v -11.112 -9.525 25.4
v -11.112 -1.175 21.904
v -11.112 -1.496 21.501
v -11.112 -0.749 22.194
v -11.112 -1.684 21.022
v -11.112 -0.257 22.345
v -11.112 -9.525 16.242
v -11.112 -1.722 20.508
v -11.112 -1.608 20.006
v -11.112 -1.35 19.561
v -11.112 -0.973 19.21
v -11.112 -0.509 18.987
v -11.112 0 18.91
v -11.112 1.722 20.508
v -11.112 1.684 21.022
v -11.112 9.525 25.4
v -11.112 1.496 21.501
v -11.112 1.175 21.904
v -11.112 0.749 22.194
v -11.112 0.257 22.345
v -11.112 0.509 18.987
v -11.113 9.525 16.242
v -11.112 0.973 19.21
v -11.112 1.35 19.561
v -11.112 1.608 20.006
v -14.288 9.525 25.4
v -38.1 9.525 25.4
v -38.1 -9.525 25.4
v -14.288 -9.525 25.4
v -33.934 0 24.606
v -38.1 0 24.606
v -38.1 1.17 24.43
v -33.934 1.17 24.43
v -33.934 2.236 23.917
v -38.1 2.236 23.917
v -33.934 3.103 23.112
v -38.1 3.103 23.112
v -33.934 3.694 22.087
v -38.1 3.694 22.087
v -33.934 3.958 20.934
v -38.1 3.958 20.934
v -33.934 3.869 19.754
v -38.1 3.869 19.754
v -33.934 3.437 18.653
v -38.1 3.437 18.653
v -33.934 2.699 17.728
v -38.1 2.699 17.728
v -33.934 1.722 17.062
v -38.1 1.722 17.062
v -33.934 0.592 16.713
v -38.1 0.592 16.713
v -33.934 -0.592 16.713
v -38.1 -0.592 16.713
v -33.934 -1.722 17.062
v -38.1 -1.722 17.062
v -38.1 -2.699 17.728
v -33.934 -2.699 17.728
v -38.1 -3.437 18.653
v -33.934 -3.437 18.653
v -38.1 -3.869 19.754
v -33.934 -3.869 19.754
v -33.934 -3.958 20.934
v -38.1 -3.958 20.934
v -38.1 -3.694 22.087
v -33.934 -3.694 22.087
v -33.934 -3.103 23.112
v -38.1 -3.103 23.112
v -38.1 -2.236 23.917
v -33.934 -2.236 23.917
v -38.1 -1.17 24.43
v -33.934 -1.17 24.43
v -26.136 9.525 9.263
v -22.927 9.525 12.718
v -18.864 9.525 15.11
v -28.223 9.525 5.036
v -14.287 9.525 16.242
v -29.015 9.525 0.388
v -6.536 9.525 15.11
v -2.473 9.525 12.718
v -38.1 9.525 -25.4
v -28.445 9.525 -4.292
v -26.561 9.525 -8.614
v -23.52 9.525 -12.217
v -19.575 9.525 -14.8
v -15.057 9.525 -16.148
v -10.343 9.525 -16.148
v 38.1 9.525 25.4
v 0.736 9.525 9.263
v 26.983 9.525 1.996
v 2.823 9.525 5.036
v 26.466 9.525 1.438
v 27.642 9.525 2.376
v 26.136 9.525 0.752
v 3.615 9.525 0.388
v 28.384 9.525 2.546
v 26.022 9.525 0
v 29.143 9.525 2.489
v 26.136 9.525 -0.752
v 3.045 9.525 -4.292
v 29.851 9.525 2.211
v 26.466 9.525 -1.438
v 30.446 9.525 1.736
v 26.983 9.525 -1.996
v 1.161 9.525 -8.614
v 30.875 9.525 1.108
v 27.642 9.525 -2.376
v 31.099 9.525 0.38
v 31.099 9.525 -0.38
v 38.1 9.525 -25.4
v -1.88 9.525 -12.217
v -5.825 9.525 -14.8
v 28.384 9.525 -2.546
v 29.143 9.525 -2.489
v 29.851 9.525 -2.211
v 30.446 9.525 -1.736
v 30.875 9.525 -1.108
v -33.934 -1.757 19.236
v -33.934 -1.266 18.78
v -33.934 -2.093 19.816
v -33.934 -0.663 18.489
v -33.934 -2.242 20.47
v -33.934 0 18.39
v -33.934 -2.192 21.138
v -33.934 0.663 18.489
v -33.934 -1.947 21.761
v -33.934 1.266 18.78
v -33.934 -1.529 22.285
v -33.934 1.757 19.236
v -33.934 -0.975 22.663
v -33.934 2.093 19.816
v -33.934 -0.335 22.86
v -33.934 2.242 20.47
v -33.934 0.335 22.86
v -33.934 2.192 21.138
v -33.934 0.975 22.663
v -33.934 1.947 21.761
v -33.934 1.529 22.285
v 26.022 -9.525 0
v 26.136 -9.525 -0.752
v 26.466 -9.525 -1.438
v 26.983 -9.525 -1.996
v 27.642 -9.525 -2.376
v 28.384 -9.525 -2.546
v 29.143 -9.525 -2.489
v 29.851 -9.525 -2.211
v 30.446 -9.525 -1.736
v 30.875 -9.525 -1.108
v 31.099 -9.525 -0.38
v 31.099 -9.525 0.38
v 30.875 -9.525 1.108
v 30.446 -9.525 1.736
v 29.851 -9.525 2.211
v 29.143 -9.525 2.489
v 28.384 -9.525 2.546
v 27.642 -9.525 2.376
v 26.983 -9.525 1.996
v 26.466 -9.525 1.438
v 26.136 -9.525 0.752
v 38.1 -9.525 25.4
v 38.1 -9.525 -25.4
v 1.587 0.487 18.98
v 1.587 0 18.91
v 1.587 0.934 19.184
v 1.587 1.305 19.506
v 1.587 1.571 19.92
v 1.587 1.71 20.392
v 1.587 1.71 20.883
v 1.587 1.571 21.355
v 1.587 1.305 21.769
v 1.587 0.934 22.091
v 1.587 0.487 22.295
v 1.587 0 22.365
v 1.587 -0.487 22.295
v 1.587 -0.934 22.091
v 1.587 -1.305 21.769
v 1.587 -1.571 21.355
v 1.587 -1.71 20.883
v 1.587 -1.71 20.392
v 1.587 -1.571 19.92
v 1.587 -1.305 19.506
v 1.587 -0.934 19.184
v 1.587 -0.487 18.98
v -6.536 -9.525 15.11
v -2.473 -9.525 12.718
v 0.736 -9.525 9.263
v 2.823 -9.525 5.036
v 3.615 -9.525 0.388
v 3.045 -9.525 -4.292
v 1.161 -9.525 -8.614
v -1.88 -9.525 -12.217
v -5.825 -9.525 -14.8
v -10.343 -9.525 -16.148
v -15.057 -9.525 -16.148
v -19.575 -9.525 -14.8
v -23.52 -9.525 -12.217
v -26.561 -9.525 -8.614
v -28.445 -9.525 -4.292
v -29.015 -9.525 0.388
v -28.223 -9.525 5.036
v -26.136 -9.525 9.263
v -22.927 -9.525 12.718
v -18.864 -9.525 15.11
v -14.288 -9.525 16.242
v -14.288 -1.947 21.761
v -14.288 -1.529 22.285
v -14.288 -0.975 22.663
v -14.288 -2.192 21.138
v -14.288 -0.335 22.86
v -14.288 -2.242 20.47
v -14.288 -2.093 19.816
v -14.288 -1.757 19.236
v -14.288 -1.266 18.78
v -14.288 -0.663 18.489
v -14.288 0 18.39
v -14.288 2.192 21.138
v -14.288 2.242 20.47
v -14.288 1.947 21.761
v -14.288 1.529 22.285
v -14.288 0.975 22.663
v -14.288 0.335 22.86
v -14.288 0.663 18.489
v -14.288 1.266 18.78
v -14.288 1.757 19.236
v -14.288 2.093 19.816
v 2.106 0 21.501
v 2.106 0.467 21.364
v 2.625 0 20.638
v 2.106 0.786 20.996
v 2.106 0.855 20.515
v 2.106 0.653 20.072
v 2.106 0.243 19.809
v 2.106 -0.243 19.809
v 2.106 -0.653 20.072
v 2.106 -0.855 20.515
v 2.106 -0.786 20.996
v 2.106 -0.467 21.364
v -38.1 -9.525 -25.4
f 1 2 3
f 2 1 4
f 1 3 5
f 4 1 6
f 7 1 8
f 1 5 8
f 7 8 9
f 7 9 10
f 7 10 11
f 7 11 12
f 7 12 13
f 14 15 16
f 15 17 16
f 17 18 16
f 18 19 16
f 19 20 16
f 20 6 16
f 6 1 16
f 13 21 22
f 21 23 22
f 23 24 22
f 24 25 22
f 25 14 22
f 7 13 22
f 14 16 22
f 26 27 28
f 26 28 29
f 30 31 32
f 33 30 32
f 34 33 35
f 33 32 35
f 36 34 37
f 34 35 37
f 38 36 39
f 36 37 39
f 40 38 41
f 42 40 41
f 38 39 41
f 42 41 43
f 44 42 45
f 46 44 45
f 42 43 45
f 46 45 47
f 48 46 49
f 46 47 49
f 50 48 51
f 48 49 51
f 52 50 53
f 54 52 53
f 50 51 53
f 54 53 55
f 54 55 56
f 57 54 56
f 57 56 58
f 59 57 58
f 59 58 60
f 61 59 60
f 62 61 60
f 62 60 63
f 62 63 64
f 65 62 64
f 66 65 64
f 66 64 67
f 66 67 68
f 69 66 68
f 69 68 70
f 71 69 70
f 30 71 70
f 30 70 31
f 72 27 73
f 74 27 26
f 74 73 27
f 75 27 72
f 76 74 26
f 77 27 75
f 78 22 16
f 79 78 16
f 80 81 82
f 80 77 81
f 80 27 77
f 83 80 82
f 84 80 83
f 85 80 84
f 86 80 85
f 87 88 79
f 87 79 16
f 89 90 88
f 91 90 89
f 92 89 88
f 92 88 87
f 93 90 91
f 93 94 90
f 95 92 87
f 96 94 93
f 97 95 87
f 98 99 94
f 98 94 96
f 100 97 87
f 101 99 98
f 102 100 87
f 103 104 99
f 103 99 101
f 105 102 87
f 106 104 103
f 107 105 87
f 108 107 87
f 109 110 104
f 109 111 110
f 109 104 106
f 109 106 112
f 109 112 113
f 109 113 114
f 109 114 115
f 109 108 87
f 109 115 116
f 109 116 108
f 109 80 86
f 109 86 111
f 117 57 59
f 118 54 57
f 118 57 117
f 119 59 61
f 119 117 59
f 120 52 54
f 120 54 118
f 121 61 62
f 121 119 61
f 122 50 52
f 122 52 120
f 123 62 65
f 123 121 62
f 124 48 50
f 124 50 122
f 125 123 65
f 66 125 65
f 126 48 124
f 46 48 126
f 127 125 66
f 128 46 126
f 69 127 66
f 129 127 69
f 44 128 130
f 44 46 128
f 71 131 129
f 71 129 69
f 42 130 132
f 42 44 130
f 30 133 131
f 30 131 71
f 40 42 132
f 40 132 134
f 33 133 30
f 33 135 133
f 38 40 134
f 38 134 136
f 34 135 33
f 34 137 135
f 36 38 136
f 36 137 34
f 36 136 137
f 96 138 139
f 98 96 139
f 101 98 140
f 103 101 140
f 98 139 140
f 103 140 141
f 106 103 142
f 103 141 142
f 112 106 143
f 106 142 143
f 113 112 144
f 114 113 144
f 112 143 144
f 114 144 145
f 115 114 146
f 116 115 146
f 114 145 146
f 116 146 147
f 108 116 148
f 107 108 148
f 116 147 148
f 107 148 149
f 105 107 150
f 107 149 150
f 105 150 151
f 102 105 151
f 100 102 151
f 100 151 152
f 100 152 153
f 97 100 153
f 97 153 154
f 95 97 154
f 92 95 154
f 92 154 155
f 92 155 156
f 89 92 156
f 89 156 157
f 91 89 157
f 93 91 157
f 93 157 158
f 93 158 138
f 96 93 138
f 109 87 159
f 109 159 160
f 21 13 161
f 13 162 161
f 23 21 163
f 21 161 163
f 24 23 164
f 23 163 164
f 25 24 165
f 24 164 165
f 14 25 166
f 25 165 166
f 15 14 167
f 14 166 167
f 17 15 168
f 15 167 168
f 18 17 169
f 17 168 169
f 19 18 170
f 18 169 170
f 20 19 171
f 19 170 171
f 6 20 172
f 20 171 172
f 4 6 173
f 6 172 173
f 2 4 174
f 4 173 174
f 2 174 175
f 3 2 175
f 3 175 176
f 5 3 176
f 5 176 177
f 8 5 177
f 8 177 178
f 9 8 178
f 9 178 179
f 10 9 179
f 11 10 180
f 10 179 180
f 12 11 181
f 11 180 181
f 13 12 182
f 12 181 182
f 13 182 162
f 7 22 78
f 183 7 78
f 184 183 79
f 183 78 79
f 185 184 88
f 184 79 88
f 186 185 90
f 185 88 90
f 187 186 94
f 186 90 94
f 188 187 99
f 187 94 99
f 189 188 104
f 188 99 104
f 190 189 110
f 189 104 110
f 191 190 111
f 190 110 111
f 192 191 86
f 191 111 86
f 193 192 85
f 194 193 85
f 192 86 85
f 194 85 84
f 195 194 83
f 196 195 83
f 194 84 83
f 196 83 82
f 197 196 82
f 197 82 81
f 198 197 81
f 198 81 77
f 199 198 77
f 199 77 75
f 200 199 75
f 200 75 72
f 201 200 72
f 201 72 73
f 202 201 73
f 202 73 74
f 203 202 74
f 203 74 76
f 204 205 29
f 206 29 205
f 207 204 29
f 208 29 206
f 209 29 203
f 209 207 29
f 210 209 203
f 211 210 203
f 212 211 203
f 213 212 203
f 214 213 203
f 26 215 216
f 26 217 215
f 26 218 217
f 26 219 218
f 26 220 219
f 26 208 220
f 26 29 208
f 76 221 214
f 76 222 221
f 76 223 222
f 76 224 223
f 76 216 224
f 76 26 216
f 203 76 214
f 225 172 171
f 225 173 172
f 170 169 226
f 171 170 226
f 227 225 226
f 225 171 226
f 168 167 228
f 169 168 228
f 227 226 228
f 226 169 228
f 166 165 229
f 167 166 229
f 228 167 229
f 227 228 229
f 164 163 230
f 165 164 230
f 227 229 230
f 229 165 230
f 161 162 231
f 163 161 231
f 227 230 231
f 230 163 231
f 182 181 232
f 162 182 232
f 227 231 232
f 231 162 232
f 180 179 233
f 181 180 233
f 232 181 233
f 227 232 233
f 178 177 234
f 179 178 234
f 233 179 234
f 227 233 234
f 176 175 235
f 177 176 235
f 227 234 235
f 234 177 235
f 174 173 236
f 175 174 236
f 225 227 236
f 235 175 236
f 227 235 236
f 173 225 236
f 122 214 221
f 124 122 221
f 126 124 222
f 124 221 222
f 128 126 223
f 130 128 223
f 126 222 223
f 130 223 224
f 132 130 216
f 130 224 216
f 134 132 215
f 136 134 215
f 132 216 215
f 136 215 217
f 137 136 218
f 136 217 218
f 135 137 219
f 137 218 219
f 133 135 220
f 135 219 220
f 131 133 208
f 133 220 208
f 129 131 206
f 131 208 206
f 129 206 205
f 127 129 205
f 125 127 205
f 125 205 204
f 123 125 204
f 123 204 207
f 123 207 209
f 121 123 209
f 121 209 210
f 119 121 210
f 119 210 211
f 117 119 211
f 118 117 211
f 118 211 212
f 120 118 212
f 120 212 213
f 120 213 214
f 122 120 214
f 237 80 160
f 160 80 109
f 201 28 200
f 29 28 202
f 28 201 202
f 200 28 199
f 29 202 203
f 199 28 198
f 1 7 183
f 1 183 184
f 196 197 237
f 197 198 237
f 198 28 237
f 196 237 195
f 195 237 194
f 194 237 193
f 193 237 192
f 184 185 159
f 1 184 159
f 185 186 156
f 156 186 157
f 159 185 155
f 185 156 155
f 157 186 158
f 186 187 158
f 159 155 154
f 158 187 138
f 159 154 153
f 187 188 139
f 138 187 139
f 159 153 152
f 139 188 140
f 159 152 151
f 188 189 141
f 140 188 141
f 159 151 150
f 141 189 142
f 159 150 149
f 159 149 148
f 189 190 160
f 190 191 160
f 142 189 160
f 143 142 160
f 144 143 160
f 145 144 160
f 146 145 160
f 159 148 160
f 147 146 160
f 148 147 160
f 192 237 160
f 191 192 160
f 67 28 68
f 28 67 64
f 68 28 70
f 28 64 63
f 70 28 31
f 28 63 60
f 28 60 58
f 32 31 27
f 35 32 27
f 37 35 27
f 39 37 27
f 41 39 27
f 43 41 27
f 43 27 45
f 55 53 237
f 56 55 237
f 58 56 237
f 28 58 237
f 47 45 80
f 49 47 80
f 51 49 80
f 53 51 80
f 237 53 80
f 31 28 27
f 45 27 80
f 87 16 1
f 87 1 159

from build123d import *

# Parameters (mm, degrees)
SKETCH1_W                                      = 76.2
SKETCH1_H                                      = 50.8
BOSS_EXTRUDE1_DEPTH                            = 9.525
SKETCH2_R                                      = 16.3195
CUT_EXTRUDE1_DEPTH                             = 50.595085442
SKETCH3_W                                      = 3.175
SKETCH3_H                                      = 28.019395236
CUT_EXTRUDE2_DEPTH                             = 50.595085442
CBORE_FOR_8_SOCKET_HEAD_CAP_SCREW1_D           = 4.4958
CBORE_FOR_8_SOCKET_HEAD_CAP_SCREW1_DEPTH       = 23.8125
CBORE_FOR_8_SOCKET_HEAD_CAP_SCREW1_CBORE_D     = 7.9375
CBORE_FOR_8_SOCKET_HEAD_CAP_SCREW1_CBORE_DEPTH = 4.1656
F_8_32_TAPPED_HOLE1_D                          = 3.4544
F_8_32_TAPPED_HOLE1_DEPTH                      = 12.7
F_8_32_TAPPED_HOLE1_TIP                        = 1.037806461
F_1_4_20_TAPPED_HOLE1_D                        = 5.1054


with BuildPart() as part:
    # Sketch1 → Boss-Extrude1 (new, symmetric)
    with BuildSketch(Plane(origin=(0, 0, 0), x_dir=(1, 0, 0), z_dir=(0, 1, 0))):
        Rectangle(SKETCH1_W, SKETCH1_H)
    extrude(amount=BOSS_EXTRUDE1_DEPTH, both=True)

    # Sketch2 → Cut-Extrude1 (cut, through all)
    with BuildSketch(Plane(origin=(0, 9.525, 0), x_dir=(1, 0, 0), z_dir=(0, 1, 0))):
        with Locations(Location((-12.7, 0, 0), (0, 0, 270))):
            Circle(SKETCH2_R)
    extrude(amount=-CUT_EXTRUDE1_DEPTH, mode=Mode.SUBTRACT)

    # Sketch3 → Cut-Extrude2 (cut, through all)
    with BuildSketch(Plane(origin=(0, 9.525, 0), x_dir=(1, 0, 0), z_dir=(0, 1, 0))):
        with Locations((-12.7, -14.009697618)):
            Rectangle(SKETCH3_W, SKETCH3_H)
    extrude(amount=-CUT_EXTRUDE2_DEPTH, mode=Mode.SUBTRACT)

    # CBORE for #8 Socket Head Cap Screw1
    with Locations(Plane.ZY.offset(38.1)):
        with Locations((20.6375, 0)):
            CounterBoreHole(CBORE_FOR_8_SOCKET_HEAD_CAP_SCREW1_D / 2, CBORE_FOR_8_SOCKET_HEAD_CAP_SCREW1_CBORE_D / 2, CBORE_FOR_8_SOCKET_HEAD_CAP_SCREW1_CBORE_DEPTH, depth=CBORE_FOR_8_SOCKET_HEAD_CAP_SCREW1_DEPTH)

    # #8-32 Tapped Hole1
    with Locations(Plane.ZY.offset(11.1125)):
        with Locations((20.6375, 0)):
            Hole(F_8_32_TAPPED_HOLE1_D / 2, depth=F_8_32_TAPPED_HOLE1_DEPTH)
            with Locations((0, 0, -(F_8_32_TAPPED_HOLE1_DEPTH + F_8_32_TAPPED_HOLE1_TIP / 2))):  # 118° drill point
                Cone(0, F_8_32_TAPPED_HOLE1_D / 2, F_8_32_TAPPED_HOLE1_TIP, mode=Mode.SUBTRACT)

    # 1/4-20 Tapped Hole1 (through all)
    with Locations(Plane(origin=(0, 9.525, 0), x_dir=(1, 0, 0), z_dir=(0, 1, 0))):
        with Locations((28.575, 0)):
            Hole(F_1_4_20_TAPPED_HOLE1_D / 2)


solid = part.part
